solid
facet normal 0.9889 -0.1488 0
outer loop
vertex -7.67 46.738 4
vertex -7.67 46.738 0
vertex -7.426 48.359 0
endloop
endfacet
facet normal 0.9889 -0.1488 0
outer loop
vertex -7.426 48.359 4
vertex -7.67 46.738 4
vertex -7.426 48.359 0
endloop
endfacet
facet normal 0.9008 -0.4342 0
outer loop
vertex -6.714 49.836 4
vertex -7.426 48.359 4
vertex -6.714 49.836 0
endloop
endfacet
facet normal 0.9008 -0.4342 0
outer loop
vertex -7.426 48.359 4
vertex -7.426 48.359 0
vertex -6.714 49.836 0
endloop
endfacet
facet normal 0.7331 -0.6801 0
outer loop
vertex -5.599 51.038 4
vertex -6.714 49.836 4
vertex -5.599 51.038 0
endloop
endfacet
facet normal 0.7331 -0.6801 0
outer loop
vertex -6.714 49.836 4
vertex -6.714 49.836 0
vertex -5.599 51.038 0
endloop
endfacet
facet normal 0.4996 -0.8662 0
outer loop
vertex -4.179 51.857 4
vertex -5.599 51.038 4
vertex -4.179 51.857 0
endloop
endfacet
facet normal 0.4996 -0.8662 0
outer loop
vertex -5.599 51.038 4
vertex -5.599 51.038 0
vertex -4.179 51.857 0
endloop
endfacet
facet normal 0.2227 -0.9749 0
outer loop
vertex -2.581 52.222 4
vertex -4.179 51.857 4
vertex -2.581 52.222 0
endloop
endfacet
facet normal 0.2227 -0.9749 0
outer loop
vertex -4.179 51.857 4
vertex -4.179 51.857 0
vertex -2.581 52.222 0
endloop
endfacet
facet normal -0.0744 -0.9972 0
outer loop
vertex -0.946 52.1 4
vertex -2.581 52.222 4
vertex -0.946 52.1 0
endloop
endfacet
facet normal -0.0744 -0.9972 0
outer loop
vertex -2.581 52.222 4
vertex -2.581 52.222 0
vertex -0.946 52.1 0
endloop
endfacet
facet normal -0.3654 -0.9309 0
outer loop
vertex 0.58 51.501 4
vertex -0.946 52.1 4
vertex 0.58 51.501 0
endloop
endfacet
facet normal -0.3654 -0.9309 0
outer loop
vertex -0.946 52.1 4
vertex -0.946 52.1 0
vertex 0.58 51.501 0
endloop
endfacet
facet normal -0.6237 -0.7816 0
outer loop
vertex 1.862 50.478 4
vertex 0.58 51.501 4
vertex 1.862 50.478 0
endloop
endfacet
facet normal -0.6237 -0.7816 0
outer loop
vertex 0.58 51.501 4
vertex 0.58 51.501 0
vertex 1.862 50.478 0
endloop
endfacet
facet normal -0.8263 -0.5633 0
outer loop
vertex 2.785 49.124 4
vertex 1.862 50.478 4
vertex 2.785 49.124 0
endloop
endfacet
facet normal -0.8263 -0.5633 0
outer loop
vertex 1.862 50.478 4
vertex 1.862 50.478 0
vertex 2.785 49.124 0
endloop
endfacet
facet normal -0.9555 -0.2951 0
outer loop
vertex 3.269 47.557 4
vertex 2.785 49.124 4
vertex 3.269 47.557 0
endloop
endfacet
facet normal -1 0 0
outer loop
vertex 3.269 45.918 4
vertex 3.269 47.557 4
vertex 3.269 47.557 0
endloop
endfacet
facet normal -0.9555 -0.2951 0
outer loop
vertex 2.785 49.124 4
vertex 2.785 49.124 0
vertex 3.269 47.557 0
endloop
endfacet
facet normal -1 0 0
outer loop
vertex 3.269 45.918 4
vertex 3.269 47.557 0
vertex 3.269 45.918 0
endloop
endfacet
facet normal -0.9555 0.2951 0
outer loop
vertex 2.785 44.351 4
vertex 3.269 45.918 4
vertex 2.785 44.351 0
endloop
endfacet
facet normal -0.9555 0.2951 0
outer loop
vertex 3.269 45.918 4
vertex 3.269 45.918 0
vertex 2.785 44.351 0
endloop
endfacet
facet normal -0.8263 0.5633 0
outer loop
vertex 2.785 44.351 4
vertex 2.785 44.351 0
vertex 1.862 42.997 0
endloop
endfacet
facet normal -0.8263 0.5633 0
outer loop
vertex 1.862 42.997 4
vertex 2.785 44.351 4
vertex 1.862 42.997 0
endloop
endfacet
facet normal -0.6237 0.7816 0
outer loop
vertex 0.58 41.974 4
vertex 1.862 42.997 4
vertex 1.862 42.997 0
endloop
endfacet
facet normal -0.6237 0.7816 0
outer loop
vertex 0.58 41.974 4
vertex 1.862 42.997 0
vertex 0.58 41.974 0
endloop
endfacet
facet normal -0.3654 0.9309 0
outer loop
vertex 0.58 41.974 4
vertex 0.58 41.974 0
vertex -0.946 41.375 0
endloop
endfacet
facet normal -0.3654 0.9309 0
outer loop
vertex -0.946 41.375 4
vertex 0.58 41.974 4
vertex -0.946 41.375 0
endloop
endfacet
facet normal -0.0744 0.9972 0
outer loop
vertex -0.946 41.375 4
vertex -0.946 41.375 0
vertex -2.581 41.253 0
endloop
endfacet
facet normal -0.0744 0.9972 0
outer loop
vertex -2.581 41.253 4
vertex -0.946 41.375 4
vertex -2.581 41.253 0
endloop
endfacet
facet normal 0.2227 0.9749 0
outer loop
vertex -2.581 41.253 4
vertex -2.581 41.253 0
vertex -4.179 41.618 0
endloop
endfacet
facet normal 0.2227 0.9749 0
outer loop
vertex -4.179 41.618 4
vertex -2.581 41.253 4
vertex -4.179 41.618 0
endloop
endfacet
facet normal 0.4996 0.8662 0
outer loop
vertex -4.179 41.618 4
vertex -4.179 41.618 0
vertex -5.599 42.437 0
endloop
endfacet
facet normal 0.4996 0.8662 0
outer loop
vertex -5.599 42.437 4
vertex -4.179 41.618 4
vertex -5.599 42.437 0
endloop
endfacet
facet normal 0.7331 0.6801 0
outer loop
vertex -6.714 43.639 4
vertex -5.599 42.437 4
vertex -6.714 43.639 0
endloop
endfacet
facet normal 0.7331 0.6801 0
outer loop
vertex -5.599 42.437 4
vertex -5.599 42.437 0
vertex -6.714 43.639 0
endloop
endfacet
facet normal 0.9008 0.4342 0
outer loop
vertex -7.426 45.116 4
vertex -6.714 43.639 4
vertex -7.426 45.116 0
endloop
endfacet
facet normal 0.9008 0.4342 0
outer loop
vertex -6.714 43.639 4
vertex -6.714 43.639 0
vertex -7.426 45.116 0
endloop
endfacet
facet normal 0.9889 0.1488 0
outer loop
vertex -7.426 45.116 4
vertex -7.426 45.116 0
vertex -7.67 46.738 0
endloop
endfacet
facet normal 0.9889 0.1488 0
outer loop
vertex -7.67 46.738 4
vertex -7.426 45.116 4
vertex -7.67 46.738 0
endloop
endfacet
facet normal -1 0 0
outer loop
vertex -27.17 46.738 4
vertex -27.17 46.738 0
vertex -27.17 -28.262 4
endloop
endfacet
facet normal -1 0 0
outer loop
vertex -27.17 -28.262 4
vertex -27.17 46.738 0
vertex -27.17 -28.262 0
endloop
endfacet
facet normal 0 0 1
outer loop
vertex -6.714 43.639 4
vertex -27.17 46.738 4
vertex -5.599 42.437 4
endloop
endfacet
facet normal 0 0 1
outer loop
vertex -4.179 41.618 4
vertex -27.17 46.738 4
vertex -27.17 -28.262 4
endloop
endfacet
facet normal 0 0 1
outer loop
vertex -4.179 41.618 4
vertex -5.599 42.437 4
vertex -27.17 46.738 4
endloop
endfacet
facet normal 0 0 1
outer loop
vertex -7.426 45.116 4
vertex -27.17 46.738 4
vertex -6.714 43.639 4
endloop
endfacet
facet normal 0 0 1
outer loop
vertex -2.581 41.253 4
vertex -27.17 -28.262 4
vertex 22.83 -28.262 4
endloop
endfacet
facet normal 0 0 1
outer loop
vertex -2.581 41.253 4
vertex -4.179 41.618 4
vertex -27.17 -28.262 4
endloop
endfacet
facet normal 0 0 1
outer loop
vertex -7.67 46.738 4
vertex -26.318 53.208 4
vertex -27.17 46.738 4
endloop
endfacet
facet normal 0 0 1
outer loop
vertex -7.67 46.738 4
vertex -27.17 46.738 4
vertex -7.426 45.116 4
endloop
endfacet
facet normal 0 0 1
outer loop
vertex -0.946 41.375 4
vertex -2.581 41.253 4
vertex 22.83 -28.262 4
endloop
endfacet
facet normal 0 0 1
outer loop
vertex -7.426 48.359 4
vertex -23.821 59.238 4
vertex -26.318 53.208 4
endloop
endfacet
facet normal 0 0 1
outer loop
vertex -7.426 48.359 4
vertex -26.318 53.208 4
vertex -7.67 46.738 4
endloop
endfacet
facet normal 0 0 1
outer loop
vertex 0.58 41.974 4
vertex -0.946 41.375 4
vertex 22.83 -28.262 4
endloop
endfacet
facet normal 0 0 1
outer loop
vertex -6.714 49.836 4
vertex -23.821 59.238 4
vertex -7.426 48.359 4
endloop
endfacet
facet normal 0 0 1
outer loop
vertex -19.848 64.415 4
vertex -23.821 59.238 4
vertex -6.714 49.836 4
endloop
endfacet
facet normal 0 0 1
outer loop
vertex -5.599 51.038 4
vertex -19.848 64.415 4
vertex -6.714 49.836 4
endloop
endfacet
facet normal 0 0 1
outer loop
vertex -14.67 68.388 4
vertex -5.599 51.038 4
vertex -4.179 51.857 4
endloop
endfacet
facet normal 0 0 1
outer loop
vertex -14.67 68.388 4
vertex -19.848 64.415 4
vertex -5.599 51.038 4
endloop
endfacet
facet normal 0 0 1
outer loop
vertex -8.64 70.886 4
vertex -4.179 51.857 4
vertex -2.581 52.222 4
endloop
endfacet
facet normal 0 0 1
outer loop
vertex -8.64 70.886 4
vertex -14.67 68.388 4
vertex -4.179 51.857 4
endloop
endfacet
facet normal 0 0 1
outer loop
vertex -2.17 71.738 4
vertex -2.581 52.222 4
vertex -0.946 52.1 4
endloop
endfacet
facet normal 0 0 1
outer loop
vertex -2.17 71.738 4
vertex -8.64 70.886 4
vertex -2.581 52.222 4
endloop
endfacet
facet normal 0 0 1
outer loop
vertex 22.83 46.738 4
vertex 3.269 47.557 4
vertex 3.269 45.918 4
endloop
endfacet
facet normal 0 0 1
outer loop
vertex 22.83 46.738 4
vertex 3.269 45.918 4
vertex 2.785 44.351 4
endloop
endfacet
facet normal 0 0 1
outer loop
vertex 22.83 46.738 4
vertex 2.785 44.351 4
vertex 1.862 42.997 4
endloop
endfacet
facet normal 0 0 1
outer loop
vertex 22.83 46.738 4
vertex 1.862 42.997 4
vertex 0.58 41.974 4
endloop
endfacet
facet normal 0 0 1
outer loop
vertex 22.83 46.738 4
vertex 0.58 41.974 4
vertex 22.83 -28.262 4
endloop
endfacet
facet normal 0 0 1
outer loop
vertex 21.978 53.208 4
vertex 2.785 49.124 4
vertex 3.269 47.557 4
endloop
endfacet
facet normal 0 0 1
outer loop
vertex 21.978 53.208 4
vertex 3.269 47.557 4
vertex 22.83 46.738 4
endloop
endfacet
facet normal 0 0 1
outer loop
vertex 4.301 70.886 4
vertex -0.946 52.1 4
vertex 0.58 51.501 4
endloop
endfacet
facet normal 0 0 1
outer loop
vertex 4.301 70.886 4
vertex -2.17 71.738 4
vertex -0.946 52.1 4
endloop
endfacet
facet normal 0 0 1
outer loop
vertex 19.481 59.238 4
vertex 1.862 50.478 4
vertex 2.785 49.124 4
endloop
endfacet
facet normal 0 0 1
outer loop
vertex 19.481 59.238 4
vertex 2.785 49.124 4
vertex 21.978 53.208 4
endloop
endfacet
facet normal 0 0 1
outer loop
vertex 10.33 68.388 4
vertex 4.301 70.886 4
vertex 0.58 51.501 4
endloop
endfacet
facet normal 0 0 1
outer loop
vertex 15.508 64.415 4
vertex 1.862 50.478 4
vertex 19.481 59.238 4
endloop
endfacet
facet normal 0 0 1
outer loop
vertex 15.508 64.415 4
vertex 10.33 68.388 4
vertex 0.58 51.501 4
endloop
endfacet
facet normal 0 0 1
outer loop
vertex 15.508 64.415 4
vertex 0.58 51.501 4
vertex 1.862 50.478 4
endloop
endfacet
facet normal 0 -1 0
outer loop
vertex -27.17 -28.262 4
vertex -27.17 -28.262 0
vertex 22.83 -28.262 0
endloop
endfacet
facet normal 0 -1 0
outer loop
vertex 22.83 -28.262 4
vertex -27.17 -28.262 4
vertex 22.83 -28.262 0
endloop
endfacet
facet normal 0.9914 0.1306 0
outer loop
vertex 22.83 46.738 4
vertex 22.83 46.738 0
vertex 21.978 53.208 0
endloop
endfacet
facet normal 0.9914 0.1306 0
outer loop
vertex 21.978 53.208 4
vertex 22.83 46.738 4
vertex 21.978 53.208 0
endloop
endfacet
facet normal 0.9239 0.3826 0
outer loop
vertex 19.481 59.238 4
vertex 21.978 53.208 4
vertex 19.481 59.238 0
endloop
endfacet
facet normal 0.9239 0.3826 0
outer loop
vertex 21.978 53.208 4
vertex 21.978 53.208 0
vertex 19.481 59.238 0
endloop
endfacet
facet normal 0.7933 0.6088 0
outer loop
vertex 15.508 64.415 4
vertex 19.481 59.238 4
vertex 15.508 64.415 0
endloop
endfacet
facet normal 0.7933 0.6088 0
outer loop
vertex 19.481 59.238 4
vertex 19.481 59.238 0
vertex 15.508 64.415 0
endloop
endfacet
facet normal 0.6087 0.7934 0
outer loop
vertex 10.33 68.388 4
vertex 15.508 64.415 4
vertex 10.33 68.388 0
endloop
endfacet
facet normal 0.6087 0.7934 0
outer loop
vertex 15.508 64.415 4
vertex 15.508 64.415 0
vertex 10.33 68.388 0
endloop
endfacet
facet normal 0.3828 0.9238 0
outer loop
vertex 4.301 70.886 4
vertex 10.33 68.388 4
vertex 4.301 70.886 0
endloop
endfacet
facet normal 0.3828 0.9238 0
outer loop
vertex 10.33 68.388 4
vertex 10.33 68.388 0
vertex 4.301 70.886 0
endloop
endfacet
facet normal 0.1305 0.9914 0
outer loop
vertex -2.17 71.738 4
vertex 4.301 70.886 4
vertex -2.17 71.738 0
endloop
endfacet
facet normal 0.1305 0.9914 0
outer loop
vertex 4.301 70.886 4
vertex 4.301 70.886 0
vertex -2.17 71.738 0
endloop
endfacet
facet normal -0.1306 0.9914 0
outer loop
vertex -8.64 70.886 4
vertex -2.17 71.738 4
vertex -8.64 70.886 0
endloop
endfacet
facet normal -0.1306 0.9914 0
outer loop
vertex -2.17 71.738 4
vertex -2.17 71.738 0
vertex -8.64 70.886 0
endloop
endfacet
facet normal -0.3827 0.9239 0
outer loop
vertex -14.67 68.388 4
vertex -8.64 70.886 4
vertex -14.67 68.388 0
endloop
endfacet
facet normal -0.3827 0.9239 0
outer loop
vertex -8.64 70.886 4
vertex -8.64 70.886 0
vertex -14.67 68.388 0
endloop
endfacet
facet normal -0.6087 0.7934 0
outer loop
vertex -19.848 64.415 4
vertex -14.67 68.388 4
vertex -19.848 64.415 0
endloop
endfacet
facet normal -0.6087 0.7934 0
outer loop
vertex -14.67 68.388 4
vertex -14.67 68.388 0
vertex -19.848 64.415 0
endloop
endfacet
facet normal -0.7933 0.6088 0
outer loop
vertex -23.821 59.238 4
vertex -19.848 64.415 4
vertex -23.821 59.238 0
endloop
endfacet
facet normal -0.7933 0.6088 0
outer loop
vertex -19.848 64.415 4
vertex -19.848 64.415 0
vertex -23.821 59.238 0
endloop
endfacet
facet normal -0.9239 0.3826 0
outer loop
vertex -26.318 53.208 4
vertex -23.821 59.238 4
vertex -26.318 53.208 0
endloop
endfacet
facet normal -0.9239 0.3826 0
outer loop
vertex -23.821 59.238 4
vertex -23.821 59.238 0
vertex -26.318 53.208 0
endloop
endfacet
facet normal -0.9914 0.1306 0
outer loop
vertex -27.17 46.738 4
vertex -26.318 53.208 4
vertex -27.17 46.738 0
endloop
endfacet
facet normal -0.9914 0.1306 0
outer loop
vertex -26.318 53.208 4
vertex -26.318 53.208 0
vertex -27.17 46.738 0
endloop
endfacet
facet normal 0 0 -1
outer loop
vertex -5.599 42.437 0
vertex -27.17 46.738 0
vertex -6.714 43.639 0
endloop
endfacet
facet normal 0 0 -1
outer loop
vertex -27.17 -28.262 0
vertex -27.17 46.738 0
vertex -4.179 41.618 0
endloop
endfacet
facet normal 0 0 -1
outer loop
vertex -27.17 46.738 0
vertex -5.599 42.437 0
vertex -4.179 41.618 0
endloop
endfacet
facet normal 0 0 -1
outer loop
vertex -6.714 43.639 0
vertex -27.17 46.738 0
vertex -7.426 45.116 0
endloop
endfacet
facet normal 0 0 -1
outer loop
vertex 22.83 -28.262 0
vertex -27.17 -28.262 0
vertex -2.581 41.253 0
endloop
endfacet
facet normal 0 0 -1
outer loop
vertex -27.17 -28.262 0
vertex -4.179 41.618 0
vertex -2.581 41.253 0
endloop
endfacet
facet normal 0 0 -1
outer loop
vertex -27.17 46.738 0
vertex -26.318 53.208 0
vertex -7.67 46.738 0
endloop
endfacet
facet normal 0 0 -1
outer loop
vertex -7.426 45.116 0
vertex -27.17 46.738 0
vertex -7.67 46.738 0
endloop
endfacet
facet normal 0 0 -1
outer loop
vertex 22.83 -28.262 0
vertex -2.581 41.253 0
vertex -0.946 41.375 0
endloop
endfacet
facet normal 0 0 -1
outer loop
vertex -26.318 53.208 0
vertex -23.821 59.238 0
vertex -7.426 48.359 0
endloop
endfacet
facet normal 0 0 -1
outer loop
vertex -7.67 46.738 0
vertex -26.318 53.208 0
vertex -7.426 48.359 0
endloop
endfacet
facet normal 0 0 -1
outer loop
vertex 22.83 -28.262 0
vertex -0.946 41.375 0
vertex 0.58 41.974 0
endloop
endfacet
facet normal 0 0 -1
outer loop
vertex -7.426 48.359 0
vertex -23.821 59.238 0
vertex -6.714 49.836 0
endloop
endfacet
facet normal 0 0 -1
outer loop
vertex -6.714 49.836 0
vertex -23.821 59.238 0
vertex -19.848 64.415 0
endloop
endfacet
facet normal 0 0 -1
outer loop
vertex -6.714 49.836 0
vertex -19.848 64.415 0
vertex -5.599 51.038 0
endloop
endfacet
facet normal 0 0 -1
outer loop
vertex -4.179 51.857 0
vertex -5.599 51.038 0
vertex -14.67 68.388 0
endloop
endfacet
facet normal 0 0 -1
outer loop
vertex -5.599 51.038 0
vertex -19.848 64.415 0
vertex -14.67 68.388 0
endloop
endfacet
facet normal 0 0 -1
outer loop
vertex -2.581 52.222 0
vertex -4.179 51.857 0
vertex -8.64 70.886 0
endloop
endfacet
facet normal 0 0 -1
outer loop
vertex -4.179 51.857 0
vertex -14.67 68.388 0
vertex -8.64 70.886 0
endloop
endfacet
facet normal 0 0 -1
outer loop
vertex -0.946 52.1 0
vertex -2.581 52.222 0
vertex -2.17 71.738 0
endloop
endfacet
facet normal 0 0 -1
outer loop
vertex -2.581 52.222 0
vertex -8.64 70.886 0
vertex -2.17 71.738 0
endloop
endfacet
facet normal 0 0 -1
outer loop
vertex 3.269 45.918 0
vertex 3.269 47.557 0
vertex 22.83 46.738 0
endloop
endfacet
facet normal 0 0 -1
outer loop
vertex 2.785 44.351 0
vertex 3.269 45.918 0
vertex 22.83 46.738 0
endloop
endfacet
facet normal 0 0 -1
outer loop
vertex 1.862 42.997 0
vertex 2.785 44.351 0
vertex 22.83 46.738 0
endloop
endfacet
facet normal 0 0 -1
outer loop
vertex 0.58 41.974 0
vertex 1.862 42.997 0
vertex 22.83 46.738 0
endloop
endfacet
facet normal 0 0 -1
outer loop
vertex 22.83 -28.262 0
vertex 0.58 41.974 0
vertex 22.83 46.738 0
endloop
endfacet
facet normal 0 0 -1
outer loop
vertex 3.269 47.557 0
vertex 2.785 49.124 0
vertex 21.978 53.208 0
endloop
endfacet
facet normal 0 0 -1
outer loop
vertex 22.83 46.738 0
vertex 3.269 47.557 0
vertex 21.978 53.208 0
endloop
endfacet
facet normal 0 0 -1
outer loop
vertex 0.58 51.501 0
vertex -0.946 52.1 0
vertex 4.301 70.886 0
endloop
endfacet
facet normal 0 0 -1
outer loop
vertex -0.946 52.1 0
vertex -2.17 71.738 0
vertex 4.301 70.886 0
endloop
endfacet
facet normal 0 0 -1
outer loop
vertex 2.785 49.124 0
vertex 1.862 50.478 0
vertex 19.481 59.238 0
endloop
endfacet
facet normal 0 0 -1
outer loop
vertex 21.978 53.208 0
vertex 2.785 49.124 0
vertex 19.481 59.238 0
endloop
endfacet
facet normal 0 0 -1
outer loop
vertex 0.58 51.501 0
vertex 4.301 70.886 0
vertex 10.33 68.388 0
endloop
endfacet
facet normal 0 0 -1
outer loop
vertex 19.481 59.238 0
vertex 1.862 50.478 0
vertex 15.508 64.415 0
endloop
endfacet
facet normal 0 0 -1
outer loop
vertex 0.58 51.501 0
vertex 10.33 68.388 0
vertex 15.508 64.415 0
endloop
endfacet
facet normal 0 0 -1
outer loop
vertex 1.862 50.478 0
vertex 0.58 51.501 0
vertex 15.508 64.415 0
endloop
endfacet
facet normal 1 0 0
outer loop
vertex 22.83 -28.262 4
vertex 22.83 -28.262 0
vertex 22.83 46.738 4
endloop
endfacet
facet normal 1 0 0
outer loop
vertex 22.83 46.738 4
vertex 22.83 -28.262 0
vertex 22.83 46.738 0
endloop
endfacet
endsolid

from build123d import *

# Parameters (mm, degrees)
F1_DEPTH = 4


with BuildPart() as f1:
    # F0 (on Top) → F1 (new body)
    with BuildSketch(Plane.XY):
        with BuildLine():
            Line((22.830044, -28.262451), (22.830044, 46.737549))
            Line((22.830044, 46.737549), (3.330044, 46.737549))
            ThreePointArc((3.330044, 46.737549), (-2.169956, 41.237549), (-7.669956, 46.737549))
            Line((-7.669956, 46.737549), (-27.169956, 46.737549))
            Line((-27.169956, 46.737549), (-27.169956, -28.262451))
            Line((-27.169956, -28.262451), (22.830044, -28.262451))
        make_face()
        with BuildLine():
            Line((3.330044, 46.737549), (22.830044, 46.737549))
            ThreePointArc((22.830044, 46.737549), (-2.169956, 71.737549), (-27.169956, 46.737549))
            Line((-27.169956, 46.737549), (-7.669956, 46.737549))
            ThreePointArc((-7.669956, 46.737549), (-2.169956, 52.237549), (3.330044, 46.737549))
        make_face()
    extrude(amount=F1_DEPTH)


solid = f1.part
